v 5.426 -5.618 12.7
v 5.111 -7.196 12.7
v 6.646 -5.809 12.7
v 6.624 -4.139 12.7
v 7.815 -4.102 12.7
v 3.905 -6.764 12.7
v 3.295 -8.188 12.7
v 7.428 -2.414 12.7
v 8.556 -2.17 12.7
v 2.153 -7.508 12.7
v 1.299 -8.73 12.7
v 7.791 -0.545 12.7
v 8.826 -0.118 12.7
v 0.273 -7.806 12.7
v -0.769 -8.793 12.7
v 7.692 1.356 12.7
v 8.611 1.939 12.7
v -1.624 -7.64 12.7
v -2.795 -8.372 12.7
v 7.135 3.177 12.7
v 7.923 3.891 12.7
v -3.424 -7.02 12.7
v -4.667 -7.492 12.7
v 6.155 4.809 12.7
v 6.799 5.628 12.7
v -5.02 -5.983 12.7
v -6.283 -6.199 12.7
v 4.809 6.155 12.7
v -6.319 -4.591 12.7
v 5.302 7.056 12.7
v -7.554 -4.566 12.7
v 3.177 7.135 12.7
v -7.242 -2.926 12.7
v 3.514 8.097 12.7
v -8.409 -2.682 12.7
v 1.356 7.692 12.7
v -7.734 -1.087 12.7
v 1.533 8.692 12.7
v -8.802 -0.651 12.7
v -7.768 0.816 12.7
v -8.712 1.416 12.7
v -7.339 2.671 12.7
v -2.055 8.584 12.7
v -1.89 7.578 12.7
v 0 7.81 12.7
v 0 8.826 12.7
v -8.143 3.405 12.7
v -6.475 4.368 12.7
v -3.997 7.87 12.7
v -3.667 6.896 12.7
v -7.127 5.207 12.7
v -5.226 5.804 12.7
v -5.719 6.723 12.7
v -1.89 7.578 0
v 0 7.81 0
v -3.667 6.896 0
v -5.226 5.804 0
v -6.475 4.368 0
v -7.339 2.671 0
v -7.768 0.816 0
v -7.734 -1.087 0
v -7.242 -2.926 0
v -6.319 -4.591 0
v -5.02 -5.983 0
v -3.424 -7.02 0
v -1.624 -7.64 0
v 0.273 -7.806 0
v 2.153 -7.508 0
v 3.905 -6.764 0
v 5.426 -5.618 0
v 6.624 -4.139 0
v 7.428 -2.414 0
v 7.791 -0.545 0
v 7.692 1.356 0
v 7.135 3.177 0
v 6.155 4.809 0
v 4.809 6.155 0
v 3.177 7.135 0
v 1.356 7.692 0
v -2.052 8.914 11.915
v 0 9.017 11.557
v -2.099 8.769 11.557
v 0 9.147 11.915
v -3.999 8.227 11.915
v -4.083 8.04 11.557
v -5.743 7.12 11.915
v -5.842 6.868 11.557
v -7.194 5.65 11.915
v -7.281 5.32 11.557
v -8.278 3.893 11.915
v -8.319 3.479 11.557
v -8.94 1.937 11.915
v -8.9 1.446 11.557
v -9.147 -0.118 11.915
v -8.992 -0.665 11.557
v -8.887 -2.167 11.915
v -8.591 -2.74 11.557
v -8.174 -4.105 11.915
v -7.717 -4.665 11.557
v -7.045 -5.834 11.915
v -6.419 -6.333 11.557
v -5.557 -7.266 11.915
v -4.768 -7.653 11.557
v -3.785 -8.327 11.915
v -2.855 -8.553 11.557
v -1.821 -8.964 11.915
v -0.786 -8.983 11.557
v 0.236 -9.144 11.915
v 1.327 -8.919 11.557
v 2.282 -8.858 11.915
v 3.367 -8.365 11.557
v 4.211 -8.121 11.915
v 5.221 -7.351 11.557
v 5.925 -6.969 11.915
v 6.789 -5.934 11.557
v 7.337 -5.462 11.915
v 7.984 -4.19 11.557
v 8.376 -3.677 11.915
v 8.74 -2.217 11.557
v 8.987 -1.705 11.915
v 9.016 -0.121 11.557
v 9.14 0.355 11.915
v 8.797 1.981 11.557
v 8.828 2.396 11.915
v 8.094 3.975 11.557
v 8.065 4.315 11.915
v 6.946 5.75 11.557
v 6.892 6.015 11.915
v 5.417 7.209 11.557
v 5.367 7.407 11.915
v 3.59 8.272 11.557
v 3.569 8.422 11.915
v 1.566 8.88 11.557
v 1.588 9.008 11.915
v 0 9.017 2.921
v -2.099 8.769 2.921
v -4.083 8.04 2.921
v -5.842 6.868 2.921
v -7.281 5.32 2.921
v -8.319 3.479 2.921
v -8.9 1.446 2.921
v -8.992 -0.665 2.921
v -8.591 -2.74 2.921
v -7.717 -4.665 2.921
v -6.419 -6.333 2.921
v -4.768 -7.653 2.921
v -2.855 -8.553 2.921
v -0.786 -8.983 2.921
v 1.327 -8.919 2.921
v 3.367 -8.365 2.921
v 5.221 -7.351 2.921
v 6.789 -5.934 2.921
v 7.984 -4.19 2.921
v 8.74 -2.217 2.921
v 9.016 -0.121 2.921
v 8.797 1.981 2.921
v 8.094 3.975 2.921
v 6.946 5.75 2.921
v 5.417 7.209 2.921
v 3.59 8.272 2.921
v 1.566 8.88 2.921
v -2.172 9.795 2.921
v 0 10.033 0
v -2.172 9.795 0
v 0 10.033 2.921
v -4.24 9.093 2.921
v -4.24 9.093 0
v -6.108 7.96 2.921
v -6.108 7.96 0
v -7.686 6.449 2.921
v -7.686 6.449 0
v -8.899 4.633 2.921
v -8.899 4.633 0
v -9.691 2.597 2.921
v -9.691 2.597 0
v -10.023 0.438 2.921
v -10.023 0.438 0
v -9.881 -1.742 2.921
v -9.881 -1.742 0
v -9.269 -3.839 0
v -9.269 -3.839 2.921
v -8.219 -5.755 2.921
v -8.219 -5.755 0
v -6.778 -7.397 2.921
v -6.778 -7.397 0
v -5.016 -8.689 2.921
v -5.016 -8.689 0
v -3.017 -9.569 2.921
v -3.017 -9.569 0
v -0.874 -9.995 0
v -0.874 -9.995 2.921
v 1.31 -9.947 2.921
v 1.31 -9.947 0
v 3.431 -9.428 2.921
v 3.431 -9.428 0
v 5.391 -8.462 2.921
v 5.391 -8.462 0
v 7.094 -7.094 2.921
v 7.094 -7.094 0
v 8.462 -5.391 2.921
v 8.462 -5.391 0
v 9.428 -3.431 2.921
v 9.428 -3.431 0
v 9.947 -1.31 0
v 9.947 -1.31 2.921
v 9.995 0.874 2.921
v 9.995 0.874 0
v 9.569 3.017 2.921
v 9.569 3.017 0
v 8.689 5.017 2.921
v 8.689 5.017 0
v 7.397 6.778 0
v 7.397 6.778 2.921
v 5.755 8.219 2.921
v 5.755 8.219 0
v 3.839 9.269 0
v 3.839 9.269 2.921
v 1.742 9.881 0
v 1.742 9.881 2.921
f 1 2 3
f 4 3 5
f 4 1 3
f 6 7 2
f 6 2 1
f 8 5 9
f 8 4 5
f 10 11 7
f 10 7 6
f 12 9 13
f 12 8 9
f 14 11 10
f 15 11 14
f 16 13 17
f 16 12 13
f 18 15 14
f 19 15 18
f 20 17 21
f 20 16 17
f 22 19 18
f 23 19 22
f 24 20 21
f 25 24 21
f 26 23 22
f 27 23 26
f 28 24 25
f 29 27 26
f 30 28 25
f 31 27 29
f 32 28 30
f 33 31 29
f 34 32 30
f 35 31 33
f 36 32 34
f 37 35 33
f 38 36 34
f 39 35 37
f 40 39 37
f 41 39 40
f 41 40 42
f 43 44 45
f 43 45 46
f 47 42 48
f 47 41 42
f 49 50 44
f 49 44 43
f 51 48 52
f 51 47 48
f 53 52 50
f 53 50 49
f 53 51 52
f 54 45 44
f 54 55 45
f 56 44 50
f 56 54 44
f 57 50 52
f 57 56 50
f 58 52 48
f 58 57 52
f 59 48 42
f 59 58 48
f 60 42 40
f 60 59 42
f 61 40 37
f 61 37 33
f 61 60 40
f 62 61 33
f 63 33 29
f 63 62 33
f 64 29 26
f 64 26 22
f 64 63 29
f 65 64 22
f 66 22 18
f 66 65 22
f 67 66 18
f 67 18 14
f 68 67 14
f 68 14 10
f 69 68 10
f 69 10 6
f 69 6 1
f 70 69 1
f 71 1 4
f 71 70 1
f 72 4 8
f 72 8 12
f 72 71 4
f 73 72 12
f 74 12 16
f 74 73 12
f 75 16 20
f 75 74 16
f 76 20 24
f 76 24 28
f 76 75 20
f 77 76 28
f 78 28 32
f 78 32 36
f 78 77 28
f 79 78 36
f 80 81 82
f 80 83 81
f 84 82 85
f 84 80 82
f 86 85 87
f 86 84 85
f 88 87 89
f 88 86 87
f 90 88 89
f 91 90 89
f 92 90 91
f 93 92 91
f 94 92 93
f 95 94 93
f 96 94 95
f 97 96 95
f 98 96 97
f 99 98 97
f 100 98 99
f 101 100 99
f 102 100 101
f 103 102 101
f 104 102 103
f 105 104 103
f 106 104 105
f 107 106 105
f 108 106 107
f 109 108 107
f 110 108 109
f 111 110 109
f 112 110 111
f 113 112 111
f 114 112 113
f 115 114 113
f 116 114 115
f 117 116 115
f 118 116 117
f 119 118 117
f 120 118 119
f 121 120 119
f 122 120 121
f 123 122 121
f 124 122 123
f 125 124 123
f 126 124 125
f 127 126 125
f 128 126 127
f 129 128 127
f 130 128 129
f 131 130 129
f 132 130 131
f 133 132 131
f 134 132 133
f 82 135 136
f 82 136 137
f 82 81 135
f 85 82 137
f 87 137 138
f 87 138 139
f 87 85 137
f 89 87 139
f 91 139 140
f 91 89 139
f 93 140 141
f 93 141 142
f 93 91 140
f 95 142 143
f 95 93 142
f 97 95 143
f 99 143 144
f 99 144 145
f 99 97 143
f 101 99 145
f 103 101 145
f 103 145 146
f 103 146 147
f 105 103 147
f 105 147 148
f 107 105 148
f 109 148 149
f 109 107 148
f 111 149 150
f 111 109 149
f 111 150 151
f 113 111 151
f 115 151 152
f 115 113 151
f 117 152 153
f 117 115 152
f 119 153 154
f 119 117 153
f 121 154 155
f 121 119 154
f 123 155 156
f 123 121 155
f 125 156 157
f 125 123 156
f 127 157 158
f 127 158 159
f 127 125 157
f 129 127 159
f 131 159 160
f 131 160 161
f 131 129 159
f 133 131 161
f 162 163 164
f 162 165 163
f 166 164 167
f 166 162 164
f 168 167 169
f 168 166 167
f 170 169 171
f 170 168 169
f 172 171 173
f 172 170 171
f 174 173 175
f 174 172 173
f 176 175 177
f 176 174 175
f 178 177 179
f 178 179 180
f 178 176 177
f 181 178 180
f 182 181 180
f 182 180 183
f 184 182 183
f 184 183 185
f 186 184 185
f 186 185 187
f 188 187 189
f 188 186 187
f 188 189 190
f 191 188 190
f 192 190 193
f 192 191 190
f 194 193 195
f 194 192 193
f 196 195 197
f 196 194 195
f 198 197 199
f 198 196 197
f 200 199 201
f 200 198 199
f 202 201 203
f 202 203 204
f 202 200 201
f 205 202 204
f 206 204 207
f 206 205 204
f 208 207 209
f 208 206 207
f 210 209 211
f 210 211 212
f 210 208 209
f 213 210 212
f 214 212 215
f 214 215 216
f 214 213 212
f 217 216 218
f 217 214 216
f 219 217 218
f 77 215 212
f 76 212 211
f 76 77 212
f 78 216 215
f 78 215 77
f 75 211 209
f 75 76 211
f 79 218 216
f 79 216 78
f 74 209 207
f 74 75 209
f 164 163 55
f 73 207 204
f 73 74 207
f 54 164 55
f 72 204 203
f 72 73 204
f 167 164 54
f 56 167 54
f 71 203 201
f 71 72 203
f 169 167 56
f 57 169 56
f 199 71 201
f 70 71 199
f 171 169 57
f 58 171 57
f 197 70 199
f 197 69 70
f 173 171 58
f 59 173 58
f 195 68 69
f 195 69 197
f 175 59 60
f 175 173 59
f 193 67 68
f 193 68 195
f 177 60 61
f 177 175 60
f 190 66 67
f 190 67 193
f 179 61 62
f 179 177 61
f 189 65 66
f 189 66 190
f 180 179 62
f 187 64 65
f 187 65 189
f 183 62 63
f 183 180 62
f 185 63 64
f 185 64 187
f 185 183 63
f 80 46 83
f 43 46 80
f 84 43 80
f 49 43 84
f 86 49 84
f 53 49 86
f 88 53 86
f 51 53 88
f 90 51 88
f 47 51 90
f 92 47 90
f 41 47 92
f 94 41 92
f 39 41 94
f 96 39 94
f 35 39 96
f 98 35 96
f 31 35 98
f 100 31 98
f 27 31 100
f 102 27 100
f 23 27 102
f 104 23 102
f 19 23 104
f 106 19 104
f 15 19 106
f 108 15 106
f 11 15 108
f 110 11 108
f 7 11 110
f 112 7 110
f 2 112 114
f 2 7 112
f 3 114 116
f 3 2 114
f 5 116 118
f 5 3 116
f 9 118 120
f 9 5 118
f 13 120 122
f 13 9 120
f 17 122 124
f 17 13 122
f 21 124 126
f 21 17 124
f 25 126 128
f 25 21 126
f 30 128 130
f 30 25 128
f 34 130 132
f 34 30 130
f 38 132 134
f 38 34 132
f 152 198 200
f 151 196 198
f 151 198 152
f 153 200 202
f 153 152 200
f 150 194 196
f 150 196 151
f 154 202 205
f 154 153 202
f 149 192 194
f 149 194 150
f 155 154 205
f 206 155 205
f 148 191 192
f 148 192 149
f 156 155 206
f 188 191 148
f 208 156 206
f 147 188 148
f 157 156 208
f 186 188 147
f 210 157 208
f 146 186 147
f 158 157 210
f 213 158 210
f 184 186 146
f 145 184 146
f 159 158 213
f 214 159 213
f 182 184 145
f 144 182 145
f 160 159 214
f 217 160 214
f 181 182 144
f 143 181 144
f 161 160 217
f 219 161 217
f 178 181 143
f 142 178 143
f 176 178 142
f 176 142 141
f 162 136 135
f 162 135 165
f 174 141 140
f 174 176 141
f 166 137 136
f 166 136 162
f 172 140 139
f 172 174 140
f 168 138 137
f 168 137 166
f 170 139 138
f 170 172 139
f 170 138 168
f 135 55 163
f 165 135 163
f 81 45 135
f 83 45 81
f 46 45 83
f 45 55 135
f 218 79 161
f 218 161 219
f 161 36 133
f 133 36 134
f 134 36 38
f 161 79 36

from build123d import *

# Parameters (mm, degrees)
F2_ANGLE = 350


with BuildPart() as f2:
    # F0 (on Right) → F2 (revolve)
    with BuildSketch(Plane.YZ):
        Polygon((7.8105, 12.7), (7.8105, 0), (10.033, 0), (10.033, 2.921), (9.017, 2.921), (9.017, 11.557), (9.14731, 11.915023), (8.8265, 12.7), align=None)
    revolve(axis=Axis((0, 0, 15.063431), (0, 0, 1)), revolution_arc=F2_ANGLE)


solid = f2.part
